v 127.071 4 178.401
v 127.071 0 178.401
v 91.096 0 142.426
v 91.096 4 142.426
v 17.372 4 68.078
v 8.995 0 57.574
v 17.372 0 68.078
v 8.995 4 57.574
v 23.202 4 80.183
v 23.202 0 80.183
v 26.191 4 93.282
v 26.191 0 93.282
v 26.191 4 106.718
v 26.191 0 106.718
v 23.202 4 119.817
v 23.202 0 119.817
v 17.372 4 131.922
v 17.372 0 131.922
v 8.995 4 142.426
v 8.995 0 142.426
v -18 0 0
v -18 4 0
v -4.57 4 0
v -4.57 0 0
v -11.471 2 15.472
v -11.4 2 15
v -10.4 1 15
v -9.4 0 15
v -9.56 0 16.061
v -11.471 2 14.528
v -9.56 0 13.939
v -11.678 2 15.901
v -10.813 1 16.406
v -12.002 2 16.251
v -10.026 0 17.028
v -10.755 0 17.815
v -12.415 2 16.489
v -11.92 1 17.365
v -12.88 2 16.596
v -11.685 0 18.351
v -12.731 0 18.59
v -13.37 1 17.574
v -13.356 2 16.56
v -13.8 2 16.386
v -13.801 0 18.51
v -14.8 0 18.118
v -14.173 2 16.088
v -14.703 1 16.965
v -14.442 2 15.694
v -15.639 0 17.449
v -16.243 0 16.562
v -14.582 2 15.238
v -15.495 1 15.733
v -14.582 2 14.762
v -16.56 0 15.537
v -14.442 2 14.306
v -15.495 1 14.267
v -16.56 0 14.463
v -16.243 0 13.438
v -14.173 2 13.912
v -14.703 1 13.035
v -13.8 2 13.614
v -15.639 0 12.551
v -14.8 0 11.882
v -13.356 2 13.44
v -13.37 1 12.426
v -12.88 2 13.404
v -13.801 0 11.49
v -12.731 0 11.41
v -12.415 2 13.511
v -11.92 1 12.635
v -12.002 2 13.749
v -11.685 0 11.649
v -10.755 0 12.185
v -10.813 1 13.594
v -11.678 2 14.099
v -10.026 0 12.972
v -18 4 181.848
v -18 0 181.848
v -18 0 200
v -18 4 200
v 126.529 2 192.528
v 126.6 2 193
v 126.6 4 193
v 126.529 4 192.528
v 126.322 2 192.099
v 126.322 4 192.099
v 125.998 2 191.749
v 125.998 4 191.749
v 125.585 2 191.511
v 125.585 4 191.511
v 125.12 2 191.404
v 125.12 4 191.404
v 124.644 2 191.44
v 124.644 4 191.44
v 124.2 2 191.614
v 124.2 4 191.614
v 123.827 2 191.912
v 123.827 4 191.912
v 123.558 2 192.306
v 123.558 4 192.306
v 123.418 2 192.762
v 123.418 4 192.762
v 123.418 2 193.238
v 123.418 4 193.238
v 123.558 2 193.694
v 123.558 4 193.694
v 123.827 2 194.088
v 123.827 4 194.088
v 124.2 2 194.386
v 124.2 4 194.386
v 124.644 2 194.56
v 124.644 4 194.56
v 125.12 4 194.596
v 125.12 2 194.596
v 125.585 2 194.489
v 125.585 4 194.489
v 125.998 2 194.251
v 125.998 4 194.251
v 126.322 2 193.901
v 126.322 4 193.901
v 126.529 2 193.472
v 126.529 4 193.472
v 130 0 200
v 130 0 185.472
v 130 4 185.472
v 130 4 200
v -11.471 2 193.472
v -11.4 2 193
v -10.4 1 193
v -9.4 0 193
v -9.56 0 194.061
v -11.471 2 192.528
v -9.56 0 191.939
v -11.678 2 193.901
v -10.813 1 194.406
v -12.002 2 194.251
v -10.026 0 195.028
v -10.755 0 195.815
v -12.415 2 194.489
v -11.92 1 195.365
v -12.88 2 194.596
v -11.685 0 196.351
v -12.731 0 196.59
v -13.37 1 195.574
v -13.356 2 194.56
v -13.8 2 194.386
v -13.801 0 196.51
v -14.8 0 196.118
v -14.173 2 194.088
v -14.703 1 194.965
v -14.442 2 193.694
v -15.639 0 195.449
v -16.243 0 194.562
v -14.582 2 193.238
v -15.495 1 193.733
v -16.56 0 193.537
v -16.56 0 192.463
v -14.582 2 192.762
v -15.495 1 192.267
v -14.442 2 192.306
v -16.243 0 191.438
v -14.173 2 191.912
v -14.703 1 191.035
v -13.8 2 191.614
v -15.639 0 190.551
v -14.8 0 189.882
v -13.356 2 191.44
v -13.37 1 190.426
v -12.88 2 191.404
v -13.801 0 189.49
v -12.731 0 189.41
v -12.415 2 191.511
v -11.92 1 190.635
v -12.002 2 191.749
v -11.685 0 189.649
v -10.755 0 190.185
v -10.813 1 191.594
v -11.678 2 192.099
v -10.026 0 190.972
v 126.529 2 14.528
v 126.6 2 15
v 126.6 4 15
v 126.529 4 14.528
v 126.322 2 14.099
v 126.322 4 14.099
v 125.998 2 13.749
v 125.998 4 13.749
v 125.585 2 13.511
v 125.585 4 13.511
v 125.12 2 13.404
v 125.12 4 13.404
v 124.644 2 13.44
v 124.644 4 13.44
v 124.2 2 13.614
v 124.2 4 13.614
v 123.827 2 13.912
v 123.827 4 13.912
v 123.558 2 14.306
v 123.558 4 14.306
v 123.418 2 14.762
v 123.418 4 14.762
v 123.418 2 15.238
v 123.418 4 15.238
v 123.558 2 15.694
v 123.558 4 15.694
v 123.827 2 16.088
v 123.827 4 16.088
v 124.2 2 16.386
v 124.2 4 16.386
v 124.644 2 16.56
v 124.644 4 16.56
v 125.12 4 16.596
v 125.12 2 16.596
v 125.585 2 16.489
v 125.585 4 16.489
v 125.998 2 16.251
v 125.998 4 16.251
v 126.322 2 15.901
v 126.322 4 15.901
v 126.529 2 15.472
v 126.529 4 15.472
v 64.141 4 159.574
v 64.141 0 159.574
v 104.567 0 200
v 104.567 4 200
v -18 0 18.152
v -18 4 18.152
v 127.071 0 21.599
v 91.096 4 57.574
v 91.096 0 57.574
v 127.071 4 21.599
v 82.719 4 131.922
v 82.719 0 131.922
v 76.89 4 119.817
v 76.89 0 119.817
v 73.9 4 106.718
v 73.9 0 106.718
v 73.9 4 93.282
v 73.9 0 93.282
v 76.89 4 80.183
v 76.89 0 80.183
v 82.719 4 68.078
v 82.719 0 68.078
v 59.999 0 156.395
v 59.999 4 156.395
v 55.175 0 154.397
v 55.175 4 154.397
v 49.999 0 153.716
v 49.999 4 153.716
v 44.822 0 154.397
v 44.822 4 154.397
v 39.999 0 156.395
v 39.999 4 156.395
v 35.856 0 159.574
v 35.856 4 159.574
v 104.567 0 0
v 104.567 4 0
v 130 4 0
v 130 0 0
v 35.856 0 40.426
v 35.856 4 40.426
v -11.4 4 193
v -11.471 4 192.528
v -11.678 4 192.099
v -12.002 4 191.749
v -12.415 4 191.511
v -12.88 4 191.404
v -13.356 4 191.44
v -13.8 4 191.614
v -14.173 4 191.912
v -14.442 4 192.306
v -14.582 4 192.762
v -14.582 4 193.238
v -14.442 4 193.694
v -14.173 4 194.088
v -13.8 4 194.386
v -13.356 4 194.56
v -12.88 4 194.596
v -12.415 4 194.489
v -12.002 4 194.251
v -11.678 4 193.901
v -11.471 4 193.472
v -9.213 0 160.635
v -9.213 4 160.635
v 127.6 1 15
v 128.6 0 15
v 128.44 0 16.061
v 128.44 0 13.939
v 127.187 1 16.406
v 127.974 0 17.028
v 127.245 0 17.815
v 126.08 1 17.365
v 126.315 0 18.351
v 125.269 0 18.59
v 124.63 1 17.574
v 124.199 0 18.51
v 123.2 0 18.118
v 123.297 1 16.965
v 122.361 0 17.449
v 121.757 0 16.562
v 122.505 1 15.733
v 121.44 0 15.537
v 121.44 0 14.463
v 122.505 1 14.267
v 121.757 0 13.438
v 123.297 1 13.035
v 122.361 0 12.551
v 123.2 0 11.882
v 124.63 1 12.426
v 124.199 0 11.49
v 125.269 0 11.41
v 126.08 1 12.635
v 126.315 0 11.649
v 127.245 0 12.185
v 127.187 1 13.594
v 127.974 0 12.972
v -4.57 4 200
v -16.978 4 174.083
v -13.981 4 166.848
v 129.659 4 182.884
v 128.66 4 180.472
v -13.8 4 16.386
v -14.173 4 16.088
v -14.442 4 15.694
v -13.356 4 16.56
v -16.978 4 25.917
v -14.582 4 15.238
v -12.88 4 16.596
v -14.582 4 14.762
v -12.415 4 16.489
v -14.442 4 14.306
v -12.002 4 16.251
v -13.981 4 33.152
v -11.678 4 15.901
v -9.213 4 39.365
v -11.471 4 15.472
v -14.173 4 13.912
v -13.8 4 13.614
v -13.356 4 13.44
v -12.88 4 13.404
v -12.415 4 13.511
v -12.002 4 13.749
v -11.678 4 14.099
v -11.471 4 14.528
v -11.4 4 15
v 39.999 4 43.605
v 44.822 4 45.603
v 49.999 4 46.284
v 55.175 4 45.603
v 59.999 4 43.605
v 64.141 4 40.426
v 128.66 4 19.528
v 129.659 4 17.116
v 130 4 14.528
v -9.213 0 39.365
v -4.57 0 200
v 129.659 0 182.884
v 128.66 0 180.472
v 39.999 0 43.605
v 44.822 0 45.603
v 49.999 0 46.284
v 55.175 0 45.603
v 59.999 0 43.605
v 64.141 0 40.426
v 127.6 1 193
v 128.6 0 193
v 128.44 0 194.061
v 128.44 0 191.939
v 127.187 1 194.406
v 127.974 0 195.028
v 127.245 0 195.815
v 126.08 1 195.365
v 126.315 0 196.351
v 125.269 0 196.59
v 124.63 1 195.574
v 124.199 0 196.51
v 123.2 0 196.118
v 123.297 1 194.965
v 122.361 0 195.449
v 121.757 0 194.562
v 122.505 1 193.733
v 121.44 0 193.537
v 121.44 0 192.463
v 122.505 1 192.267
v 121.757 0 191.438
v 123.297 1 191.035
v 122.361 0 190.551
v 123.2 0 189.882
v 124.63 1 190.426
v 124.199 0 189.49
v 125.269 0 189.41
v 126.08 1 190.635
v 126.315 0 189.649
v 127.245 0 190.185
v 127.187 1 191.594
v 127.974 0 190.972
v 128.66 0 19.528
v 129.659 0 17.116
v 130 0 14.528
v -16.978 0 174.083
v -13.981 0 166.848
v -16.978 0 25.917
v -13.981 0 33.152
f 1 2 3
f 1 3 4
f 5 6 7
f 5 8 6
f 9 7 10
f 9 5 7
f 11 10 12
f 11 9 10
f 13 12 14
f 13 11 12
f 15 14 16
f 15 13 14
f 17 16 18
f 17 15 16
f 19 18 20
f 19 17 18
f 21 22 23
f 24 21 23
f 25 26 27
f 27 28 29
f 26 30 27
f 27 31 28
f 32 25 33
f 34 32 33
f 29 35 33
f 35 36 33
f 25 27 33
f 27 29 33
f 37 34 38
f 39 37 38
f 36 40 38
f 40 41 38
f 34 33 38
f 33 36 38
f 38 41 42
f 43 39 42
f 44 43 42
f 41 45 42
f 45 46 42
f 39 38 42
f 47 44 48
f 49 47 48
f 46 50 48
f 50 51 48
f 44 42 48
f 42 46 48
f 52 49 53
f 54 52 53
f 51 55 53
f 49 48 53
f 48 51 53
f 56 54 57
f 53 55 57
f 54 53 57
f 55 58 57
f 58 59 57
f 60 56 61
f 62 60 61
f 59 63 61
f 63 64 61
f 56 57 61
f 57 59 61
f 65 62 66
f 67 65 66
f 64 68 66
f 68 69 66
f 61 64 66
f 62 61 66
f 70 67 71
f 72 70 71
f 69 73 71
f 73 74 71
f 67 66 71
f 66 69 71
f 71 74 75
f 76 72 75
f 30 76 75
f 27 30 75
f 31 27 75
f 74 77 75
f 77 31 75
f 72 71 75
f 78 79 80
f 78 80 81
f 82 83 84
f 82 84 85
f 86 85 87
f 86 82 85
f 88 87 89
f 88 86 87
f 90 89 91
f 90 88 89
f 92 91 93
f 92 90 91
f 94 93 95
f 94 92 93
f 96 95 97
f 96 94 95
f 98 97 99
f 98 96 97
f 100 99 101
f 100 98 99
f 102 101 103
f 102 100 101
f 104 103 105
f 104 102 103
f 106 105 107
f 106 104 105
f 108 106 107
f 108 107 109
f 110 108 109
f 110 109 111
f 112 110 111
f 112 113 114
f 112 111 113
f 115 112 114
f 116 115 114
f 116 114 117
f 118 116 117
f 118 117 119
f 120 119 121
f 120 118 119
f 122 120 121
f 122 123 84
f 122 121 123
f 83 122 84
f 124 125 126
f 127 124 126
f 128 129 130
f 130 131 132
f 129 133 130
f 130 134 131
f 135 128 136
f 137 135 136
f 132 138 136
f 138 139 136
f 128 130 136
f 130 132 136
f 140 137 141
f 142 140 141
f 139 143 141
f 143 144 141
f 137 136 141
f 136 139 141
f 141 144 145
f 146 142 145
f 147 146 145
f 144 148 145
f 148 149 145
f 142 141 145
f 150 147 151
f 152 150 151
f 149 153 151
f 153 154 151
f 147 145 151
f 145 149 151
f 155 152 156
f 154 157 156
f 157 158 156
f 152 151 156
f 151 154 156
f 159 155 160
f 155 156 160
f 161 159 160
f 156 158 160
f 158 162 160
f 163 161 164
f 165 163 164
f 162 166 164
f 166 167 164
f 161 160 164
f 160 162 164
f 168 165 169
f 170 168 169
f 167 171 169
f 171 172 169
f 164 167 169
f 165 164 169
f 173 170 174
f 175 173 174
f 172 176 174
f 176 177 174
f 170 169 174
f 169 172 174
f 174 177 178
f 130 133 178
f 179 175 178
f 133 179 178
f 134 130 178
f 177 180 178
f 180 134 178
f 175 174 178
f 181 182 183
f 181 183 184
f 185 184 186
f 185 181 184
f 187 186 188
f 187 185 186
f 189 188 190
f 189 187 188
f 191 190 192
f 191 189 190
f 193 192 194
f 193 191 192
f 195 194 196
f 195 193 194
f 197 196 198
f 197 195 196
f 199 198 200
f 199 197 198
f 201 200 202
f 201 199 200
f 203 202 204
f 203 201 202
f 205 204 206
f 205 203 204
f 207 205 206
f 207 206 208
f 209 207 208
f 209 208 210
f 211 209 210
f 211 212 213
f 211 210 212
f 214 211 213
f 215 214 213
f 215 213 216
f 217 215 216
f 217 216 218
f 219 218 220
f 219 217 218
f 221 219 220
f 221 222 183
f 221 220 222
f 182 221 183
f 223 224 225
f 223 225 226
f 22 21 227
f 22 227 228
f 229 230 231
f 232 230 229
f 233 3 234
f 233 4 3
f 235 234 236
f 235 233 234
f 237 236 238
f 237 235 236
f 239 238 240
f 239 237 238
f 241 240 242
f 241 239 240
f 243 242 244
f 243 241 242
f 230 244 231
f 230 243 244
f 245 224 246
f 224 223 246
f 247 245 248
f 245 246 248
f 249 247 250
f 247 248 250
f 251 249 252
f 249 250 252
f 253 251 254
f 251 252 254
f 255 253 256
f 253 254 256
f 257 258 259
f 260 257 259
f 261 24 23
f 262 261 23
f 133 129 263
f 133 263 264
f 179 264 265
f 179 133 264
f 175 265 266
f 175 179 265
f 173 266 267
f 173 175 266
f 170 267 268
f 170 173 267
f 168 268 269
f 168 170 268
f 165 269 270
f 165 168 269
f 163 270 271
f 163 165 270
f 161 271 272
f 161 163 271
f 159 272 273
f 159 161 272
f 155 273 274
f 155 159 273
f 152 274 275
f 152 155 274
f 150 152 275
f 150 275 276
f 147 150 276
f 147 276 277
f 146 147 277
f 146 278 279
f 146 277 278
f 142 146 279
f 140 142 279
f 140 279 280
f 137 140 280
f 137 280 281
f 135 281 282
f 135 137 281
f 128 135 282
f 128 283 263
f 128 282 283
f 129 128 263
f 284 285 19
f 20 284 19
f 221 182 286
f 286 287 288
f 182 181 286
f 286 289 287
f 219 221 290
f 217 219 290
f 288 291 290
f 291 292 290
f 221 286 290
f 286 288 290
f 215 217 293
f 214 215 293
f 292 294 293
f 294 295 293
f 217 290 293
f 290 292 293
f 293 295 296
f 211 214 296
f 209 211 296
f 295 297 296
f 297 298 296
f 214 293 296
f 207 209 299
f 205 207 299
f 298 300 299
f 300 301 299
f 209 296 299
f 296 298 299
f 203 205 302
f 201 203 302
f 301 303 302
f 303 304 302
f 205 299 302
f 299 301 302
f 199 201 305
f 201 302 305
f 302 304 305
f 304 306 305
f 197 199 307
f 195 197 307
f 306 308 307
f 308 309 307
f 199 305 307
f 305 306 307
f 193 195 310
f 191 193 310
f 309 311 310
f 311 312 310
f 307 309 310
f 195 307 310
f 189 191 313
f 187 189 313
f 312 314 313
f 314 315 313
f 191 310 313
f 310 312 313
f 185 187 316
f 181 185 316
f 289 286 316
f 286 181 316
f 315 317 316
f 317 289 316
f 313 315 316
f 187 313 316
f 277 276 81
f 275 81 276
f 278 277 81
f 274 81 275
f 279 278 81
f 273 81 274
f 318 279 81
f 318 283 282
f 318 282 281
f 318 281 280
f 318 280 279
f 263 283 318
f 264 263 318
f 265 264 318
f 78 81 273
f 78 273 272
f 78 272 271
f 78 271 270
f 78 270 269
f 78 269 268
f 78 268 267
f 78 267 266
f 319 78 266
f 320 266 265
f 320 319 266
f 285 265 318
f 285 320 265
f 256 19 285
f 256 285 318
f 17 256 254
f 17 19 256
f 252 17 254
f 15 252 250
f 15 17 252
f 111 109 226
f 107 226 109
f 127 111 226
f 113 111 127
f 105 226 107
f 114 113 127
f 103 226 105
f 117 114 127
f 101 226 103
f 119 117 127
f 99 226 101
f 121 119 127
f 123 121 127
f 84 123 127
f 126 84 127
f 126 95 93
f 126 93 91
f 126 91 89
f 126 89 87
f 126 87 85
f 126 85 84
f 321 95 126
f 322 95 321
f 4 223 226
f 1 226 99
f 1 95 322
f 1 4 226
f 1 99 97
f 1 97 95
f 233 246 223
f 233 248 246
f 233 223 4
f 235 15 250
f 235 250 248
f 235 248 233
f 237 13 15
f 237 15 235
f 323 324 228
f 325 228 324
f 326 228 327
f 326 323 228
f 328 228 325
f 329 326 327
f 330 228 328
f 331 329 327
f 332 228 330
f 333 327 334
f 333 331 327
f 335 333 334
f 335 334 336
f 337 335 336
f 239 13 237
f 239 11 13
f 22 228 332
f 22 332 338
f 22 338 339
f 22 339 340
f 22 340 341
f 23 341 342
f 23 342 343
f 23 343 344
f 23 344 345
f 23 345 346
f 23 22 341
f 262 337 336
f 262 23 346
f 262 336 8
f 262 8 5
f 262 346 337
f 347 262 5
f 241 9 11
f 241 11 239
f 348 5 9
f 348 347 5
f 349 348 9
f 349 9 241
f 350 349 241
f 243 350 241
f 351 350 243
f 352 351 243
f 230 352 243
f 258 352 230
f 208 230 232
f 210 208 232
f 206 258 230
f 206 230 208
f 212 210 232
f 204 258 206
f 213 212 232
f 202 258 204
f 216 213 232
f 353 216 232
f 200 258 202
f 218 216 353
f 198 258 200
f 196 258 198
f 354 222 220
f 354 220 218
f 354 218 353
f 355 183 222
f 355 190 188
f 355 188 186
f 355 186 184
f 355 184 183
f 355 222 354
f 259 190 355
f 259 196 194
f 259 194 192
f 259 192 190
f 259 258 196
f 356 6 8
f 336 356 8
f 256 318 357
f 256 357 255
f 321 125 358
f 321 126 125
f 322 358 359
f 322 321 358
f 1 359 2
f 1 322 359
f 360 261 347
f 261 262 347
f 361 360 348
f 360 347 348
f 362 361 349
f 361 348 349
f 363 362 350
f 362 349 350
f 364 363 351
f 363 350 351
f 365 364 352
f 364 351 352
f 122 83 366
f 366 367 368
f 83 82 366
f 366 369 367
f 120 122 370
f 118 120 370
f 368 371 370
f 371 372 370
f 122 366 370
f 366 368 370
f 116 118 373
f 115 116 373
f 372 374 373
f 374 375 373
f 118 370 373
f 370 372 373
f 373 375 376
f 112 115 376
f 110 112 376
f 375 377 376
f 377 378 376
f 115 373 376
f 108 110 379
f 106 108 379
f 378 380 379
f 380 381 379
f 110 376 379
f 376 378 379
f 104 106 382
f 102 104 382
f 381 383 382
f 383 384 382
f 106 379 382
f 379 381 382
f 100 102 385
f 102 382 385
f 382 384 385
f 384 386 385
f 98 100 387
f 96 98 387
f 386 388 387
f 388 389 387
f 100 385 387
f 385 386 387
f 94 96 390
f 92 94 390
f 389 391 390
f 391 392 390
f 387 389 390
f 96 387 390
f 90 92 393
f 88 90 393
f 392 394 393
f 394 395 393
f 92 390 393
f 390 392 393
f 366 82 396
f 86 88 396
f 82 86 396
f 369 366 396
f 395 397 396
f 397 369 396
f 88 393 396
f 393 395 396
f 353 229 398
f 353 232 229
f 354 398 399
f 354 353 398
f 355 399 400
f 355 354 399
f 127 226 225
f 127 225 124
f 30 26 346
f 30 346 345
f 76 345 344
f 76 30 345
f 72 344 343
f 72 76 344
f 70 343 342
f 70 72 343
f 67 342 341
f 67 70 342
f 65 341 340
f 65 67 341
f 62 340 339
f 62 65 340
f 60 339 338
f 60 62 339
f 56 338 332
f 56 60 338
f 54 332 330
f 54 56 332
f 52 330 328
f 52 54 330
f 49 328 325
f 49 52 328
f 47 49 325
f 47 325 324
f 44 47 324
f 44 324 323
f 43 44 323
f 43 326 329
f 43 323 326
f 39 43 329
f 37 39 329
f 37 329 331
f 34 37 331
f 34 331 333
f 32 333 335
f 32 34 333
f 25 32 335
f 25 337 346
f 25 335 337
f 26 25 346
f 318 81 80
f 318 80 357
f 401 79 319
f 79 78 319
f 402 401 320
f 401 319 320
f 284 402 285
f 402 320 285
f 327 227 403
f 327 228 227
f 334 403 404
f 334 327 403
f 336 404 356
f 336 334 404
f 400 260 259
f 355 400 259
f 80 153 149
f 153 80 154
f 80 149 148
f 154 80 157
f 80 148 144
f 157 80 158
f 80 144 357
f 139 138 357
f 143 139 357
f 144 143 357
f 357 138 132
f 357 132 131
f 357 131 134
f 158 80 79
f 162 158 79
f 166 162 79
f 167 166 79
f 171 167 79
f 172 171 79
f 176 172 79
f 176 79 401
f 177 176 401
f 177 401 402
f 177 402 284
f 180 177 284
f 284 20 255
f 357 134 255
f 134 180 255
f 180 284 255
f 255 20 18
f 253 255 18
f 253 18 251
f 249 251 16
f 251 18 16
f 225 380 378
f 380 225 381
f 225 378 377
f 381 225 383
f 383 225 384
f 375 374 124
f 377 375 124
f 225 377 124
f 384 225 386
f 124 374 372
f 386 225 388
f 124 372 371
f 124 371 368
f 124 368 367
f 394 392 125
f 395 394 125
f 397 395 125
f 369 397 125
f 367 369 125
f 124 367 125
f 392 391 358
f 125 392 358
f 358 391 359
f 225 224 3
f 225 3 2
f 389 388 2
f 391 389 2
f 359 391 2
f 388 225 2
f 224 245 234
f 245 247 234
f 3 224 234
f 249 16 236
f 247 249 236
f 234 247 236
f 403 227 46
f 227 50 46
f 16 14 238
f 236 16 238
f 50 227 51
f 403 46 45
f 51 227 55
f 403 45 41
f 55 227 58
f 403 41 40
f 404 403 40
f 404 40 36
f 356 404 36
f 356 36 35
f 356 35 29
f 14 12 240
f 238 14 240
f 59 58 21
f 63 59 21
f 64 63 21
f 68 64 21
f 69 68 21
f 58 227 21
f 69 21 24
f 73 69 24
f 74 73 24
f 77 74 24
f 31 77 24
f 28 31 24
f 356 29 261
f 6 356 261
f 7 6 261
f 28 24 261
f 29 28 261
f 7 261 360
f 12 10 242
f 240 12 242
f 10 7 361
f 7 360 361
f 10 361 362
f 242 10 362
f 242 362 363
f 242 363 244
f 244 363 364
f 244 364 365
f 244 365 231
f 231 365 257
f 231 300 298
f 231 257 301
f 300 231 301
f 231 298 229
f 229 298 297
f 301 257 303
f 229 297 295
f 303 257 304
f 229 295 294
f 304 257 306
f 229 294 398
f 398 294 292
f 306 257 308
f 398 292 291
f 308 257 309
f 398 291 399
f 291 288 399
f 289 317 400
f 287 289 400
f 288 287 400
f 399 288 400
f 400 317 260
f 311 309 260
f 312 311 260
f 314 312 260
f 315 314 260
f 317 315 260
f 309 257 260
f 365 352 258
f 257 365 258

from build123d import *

# Parameters (mm, degrees)
BOX033_W               = 80
BOX033_H               = 4
BOX033_DEPTH           = 80
BOX033_PLACEMENT_ANGLE = 45
FILLET130_R            = 20
BOX035_W               = 80
BOX035_H               = 4
BOX035_DEPTH           = 80
BOX035_PLACEMENT_ANGLE = 45
FILLET131_R            = 20
BOX036_W               = 120
BOX036_H               = 4
BOX036_DEPTH           = 120
BOX036_PLACEMENT_ANGLE = 45
FILLET133_R            = 60
CYLINDER090_R          = 1.6
CYLINDER090_DEPTH      = 25
CYLINDER091_R          = 1.6
CYLINDER091_DEPTH      = 25
CYLINDER092_R          = 1.6
CYLINDER092_DEPTH      = 25
CYLINDER089_R          = 1.6
CYLINDER089_DEPTH      = 25
BOX034_W               = 100
BOX034_H               = 4
BOX034_DEPTH           = 100
BOX034_PLACEMENT_ANGLE = 45
FILLET132_R            = 60
BOX032_W               = 148
BOX032_H               = 4
BOX032_DEPTH           = 200
FILLET134_R            = 30
FILLET135_R            = 10
CHAMFER035_SIZE        = 2


with BuildPart() as fillet131:
    # Box033 → Box033 (new body)
    with BuildSketch(Plane.XY):
        with Locations((40, 2)):
            Rectangle(BOX033_W, BOX033_H)
    extrude(amount=BOX033_DEPTH)


with BuildPart() as fillet131_1:
    # Box033 placement: moved
    add(fillet131.part.moved(Location((-6.57, 0, 202))).rotate(Axis((-6.57, 0, 202), (0, 1, 0)), BOX033_PLACEMENT_ANGLE))

    # Fillet130
    fillet130_edges = [fillet131_1.edges().sort_by_distance(p)[0] for p in [
        (49.998542, 2, 145.431458),
    ]]
    fillet(fillet130_edges, radius=FILLET130_R)


with BuildPart() as fillet132:
    # Box035 → Box035 (new body)
    with BuildSketch(Plane.XY):
        with Locations((40, 2)):
            Rectangle(BOX035_W, BOX035_H)
    extrude(amount=BOX035_DEPTH)


with BuildPart() as fillet132_1:
    # Box035 placement: moved
    add(fillet132.part.moved(Location((-6.57, 0, -2))).rotate(Axis((-6.57, 0, -2), (0, 1, 0)), BOX035_PLACEMENT_ANGLE))

    # Fillet131
    fillet131_edges = [fillet132_1.edges().sort_by_distance(p)[0] for p in [
        (49.998542, 2, 54.568542),
    ]]
    fillet(fillet131_edges, radius=FILLET131_R)


with BuildPart() as fillet134:
    # Box036 → Box036 (new body)
    with BuildSketch(Plane.XY):
        with Locations((60, 2)):
            Rectangle(BOX036_W, BOX036_H)
    extrude(amount=BOX036_DEPTH)


with BuildPart() as fillet134_1:
    # Box036 placement: moved
    add(fillet134.part.moved(Location((48.67, 0, 100))).rotate(Axis((48.67, 0, 100), (0, 1, 0)), BOX036_PLACEMENT_ANGLE))

    # Fillet133
    fillet133_edges = [fillet134_1.edges().sort_by_distance(p)[0] for p in [
        (48.67, 2, 100),
    ]]
    fillet(fillet133_edges, radius=FILLET133_R)


with BuildPart() as screwholle027:
    # Cylinder090 → Cylinder090 (new body)
    with BuildSketch(Plane(origin=(125, -20, 15), x_dir=(1, 0, 0), z_dir=(0, 1, 0))):
        Circle(CYLINDER090_R)
    extrude(amount=CYLINDER090_DEPTH)


with BuildPart() as screwholle028:
    # Cylinder091 → Cylinder091 (new body)
    with BuildSketch(Plane(origin=(-13, -20, 193), x_dir=(1, 0, 0), z_dir=(0, 1, 0))):
        Circle(CYLINDER091_R)
    extrude(amount=CYLINDER091_DEPTH)


with BuildPart() as screwholle029:
    # Cylinder092 → Cylinder092 (new body)
    with BuildSketch(Plane(origin=(125, -20, 193), x_dir=(1, 0, 0), z_dir=(0, 1, 0))):
        Circle(CYLINDER092_R)
    extrude(amount=CYLINDER092_DEPTH)


with BuildPart() as screwholles001:
    # Cylinder089 → Cylinder089 (new body)
    with BuildSketch(Plane(origin=(-13, -20, 15), x_dir=(1, 0, 0), z_dir=(0, 1, 0))):
        Circle(CYLINDER089_R)
    extrude(amount=CYLINDER089_DEPTH)

    # Fusion055: union ScrewHolle027, ScrewHolle028, ScrewHolle029
    add(screwholle027.part)
    add(screwholle028.part)
    add(screwholle029.part)


with BuildPart() as fusion056:
    # Box034 → Box034 (new body)
    with BuildSketch(Plane.XY):
        with Locations((50, 2)):
            Rectangle(BOX034_W, BOX034_H)
    extrude(amount=BOX034_DEPTH)


with BuildPart() as fusion056_1:
    # Box034 placement: moved
    add(fusion056.part.moved(Location((-90, 0, 100))).rotate(Axis((-90, 0, 100), (0, 1, 0)), BOX034_PLACEMENT_ANGLE))

    # Fillet132
    fillet132_edges = [fusion056_1.edges().sort_by_distance(p)[0] for p in [
        (51.421356, 2, 100),
    ]]
    fillet(fillet132_edges, radius=FILLET132_R)

    # Fusion056: union Fillet131, Fillet132, Fillet134, ScrewHolles001
    add(fillet131_1.part)
    add(fillet132_1.part)
    add(fillet134_1.part)
    add(screwholles001.part)


with BuildPart() as support2:
    # Box032 → Box032 (new body)
    with BuildSketch(Plane(origin=(-18, 0, 0), x_dir=(1, 0, 0), z_dir=(0, 0, 1))):
        with Locations((74, 2)):
            Rectangle(BOX032_W, BOX032_H)
    extrude(amount=BOX032_DEPTH)

    # Cut017: cut Fusion056
    add(fusion056_1.part, mode=Mode.SUBTRACT)

    # Fillet134
    fillet134_edges = [support2.edges().sort_by_distance(p)[0] for p in [
        (-18, 2, 30.578644),
        (-18, 2, 169.421356),
    ]]
    fillet(fillet134_edges, radius=FILLET134_R)

    # Fillet135
    fillet135_edges = [support2.edges().sort_by_distance(p)[0] for p in [
        (130, 2, 181.33),
        (130, 2, 18.67),
    ]]
    fillet(fillet135_edges, radius=FILLET135_R)

    # Chamfer035
    chamfer035_edges = [support2.edges().sort_by_distance(p)[0] for p in [
        (-14.6, 0, 15),
        (-14.6, 0, 193),
        (123.4, 0, 15),
        (123.4, 0, 193),
    ]]
    chamfer(chamfer035_edges, length=CHAMFER035_SIZE)


solid = support2.part
